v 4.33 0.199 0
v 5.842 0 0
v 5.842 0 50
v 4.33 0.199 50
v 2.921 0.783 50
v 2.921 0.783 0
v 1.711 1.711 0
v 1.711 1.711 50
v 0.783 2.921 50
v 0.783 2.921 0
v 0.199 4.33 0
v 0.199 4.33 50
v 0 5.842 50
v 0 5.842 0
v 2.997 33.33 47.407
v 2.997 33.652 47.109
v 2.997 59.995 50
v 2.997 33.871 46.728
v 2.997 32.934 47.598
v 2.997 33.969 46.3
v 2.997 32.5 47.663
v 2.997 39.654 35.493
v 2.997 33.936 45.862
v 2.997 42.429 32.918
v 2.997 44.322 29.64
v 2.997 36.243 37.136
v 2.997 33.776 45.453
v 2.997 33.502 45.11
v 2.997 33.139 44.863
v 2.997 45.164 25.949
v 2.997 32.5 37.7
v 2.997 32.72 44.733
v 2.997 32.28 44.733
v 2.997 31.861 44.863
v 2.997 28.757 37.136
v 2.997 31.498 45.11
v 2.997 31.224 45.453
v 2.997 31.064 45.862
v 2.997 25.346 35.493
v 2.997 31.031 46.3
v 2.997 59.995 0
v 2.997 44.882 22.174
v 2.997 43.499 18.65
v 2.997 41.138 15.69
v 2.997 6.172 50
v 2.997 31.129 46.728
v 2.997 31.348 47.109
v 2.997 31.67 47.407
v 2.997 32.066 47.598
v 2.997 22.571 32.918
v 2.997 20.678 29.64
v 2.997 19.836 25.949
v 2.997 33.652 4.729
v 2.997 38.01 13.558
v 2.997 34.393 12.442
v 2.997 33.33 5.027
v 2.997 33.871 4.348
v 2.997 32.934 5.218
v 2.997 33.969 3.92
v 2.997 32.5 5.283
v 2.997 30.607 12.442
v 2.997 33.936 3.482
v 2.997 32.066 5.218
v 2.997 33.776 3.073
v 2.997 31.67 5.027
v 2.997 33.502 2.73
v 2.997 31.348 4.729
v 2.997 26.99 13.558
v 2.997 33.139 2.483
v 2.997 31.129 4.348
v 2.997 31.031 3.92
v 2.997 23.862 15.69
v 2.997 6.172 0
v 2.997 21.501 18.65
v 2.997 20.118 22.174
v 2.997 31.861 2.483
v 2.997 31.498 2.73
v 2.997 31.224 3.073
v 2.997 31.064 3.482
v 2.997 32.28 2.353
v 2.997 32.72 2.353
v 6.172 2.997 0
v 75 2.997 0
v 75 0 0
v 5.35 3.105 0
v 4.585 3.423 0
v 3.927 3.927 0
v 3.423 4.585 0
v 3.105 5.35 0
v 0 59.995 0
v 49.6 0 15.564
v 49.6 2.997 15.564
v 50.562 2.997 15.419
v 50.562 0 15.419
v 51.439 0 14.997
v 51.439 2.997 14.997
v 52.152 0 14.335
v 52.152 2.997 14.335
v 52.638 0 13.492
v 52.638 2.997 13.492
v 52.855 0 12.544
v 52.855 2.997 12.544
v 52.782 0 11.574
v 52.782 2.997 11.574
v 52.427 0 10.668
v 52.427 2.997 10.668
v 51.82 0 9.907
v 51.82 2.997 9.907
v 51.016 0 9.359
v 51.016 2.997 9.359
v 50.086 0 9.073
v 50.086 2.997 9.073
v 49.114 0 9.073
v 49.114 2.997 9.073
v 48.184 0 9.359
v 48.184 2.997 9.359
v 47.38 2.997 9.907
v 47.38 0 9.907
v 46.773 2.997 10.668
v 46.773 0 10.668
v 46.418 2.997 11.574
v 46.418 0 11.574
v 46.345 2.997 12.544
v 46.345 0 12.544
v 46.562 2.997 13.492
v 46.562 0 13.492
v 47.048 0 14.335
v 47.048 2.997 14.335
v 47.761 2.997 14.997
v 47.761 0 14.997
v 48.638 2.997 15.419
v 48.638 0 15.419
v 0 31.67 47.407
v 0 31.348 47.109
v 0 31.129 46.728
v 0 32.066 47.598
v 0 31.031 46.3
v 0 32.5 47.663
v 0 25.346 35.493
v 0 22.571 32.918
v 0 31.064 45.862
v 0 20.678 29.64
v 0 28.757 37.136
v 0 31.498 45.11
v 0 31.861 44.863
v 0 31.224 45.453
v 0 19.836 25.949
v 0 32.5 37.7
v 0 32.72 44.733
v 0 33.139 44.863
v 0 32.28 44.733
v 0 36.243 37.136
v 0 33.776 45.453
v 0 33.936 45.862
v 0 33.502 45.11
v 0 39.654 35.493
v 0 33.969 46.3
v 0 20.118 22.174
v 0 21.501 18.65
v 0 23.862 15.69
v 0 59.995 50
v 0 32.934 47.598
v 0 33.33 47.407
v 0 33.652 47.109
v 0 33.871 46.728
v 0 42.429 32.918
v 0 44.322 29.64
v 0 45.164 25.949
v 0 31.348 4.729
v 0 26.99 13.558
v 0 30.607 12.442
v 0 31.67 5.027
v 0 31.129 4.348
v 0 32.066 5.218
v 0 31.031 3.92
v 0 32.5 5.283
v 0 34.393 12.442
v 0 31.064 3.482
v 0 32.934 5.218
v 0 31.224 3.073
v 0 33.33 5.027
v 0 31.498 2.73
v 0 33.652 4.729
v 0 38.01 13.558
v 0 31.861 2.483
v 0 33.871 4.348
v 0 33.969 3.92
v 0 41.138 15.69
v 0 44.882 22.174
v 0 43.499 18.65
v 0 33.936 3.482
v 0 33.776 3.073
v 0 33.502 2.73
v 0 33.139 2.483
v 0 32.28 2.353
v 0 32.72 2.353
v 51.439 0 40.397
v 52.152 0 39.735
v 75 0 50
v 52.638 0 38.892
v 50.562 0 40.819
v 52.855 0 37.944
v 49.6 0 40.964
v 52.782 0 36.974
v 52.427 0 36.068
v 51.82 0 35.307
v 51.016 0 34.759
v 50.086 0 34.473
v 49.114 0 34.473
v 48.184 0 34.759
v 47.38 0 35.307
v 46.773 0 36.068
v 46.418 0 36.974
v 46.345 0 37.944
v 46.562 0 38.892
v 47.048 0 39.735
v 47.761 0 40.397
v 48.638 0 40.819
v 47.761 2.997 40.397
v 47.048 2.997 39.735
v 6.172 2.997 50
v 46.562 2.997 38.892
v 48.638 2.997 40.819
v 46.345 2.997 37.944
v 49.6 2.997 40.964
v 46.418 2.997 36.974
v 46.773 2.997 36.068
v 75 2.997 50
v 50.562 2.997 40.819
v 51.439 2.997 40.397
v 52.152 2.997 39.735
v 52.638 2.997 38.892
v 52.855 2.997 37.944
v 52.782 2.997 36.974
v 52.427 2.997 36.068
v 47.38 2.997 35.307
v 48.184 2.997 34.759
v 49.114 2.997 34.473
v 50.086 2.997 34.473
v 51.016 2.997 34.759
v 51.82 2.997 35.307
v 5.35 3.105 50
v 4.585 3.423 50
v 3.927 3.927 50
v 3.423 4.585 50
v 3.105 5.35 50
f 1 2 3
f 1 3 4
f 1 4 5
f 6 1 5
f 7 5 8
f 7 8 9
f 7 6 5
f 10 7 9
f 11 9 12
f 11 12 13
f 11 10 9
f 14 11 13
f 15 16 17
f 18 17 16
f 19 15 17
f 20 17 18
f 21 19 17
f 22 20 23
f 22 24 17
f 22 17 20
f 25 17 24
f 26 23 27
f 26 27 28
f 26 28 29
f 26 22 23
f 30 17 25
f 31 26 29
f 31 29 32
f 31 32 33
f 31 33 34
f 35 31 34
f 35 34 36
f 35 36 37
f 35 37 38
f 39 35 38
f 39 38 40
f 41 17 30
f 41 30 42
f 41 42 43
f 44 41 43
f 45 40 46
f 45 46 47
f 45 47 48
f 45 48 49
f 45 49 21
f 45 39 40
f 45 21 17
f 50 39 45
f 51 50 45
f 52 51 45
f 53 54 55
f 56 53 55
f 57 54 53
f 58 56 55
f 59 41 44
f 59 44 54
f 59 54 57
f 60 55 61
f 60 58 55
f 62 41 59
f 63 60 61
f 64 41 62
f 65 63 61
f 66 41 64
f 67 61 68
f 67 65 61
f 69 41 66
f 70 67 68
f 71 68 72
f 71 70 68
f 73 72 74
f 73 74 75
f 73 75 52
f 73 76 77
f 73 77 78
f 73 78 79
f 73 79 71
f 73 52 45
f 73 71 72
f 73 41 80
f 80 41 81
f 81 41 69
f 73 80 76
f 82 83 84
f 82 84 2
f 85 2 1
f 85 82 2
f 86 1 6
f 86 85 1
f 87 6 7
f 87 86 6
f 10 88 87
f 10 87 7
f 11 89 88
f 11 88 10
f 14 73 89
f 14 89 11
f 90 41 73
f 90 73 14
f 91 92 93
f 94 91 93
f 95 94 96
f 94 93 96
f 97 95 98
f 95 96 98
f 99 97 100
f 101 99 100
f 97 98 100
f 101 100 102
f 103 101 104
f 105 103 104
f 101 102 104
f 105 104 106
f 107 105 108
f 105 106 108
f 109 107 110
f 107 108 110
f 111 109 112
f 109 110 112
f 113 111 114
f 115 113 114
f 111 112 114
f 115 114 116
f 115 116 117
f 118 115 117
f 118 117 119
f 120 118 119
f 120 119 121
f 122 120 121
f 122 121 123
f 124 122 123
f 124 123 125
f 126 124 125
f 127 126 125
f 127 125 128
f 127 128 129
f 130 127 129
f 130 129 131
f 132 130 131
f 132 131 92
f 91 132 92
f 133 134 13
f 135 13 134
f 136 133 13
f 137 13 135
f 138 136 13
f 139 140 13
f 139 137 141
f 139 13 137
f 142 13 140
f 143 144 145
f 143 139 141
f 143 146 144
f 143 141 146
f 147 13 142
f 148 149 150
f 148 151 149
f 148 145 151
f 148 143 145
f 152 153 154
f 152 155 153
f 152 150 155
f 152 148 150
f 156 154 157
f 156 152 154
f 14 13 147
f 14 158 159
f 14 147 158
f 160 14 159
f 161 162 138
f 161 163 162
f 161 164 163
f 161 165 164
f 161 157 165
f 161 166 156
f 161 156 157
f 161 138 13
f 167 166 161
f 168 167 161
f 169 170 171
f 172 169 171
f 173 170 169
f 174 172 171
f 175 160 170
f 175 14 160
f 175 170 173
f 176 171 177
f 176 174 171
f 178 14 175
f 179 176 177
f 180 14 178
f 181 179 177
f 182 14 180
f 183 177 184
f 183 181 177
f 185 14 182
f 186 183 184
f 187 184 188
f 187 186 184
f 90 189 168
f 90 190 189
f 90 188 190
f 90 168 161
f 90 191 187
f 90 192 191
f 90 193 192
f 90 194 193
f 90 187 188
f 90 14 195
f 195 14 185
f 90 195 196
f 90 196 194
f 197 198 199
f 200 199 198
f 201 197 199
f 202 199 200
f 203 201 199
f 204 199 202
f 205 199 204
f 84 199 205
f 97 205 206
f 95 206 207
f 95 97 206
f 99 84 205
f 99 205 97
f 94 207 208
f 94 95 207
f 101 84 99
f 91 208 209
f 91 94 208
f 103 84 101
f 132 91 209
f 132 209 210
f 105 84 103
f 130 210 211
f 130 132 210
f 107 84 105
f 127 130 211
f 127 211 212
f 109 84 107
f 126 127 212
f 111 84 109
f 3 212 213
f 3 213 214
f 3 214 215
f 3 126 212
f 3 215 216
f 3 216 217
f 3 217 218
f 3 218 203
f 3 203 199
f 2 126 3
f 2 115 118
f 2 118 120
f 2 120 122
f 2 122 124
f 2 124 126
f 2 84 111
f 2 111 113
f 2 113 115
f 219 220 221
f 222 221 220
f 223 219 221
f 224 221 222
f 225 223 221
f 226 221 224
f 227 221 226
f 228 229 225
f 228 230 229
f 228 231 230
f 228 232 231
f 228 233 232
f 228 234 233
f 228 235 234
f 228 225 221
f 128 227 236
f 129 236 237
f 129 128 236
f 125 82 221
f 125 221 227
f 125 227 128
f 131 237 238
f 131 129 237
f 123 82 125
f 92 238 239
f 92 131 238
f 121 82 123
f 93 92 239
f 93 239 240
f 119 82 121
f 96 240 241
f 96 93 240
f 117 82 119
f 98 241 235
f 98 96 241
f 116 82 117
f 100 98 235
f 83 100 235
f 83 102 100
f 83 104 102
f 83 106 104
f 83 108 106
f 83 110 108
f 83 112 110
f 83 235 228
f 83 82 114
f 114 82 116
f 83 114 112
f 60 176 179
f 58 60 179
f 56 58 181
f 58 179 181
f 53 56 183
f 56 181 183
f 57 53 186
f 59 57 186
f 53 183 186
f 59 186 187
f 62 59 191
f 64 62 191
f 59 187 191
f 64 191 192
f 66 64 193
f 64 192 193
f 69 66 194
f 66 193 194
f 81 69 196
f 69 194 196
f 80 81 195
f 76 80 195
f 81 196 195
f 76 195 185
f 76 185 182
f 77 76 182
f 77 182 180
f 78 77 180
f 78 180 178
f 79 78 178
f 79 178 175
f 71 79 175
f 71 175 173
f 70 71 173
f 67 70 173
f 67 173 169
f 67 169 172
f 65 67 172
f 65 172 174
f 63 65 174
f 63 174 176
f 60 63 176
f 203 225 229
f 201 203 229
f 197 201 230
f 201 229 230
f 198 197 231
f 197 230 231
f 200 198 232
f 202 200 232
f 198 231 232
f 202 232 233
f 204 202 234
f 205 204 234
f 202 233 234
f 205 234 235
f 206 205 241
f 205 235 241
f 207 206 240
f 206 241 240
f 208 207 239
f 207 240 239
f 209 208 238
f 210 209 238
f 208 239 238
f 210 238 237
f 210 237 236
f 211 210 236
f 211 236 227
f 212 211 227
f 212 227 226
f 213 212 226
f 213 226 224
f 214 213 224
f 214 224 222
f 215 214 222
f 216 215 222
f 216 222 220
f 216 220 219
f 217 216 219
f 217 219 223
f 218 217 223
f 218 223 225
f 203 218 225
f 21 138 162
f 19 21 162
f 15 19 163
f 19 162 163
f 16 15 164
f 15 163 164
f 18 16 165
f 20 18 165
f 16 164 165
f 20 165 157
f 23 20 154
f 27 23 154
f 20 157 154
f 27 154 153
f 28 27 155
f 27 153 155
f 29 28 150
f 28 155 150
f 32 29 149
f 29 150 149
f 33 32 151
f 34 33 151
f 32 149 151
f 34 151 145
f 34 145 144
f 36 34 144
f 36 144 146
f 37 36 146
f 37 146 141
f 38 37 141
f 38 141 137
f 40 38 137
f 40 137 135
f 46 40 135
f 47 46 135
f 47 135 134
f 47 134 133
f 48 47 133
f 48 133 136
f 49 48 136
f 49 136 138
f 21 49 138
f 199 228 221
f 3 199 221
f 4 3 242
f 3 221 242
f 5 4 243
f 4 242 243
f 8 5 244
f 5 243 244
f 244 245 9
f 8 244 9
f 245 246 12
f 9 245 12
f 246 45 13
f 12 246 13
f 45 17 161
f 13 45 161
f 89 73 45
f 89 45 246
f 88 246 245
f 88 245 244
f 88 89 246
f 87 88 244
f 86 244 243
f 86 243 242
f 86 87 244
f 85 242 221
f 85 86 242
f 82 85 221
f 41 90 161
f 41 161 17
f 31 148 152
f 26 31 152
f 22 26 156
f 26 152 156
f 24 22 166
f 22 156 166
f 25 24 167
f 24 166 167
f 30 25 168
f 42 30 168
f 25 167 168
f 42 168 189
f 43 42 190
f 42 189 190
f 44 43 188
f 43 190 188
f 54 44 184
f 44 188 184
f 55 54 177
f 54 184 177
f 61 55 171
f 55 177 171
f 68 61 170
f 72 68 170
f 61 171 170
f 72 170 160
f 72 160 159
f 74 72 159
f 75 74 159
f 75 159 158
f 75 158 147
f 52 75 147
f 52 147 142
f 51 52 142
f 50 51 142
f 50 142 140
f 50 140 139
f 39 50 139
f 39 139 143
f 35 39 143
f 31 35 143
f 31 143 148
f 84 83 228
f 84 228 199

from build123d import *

# Parameters (mm, degrees)
BOSS_EXTRUDE1_DEPTH       = 50
SKETCH5_R                 = 3.2639
MOUNTING_HORIZONTAL_DEPTH = 107.647674169
SKETCH7_R                 = 12.7
BEARING_WITH_MOTOR_DEPTH  = 109.279157861
SKETCH8_R                 = 1.4732
F_4_40_WITH_MOTOR_DEPTH   = 109.279157861


with BuildPart() as part:
    # Sketch2 → Boss-Extrude1 (new body)
    with BuildSketch(Plane.XY):
        with BuildLine():
            Line((0, 5.842), (0, 59.9948))
            Line((0, 59.9948), (2.9972, 59.9948))
            Line((2.9972, 59.9948), (2.9972, 6.1722))
            ThreePointArc((2.9972, 6.1722), (3.92713597, 3.92713597), (6.1722, 2.9972))
            Line((6.1722, 2.9972), (75, 2.9972))
            Line((75, 2.9972), (75, 0))
            Line((75, 0), (5.842, 0))
            ThreePointArc((5.842, 0), (1.711082184, 1.711082184), (0, 5.842))
        make_face()
    extrude(amount=BOSS_EXTRUDE1_DEPTH)

    # Sketch5 → Mounting -- Horizontal (cut, through all)
    with BuildSketch(Plane(origin=(0, 2.9972, 0), x_dir=(1, 0, 0), z_dir=(0, 1, 0))):
        with Locations(Location((49.6, -12.3, 0), (0, 0, 270))):
            Circle(SKETCH5_R)
        with Locations(Location((49.6, -37.7, 0), (0, 0, 270))):
            Circle(SKETCH5_R)
    extrude(amount=-MOUNTING_HORIZONTAL_DEPTH, mode=Mode.SUBTRACT)

    # Sketch7 → Bearing -- With Motor (cut, through all)
    with BuildSketch(Plane.ZY):
        with Locations((25, 32.5)):
            Circle(SKETCH7_R)
    extrude(amount=-BEARING_WITH_MOTOR_DEPTH, mode=Mode.SUBTRACT)

    # Sketch8 → 4-40 -- With Motor (cut, through all)
    with BuildSketch(Plane.ZY):
        with Locations((3.81, 32.5)):
            Circle(SKETCH8_R)
        with Locations((46.19, 32.5)):
            Circle(SKETCH8_R)
    extrude(amount=-F_4_40_WITH_MOTOR_DEPTH, mode=Mode.SUBTRACT)


solid = part.part
